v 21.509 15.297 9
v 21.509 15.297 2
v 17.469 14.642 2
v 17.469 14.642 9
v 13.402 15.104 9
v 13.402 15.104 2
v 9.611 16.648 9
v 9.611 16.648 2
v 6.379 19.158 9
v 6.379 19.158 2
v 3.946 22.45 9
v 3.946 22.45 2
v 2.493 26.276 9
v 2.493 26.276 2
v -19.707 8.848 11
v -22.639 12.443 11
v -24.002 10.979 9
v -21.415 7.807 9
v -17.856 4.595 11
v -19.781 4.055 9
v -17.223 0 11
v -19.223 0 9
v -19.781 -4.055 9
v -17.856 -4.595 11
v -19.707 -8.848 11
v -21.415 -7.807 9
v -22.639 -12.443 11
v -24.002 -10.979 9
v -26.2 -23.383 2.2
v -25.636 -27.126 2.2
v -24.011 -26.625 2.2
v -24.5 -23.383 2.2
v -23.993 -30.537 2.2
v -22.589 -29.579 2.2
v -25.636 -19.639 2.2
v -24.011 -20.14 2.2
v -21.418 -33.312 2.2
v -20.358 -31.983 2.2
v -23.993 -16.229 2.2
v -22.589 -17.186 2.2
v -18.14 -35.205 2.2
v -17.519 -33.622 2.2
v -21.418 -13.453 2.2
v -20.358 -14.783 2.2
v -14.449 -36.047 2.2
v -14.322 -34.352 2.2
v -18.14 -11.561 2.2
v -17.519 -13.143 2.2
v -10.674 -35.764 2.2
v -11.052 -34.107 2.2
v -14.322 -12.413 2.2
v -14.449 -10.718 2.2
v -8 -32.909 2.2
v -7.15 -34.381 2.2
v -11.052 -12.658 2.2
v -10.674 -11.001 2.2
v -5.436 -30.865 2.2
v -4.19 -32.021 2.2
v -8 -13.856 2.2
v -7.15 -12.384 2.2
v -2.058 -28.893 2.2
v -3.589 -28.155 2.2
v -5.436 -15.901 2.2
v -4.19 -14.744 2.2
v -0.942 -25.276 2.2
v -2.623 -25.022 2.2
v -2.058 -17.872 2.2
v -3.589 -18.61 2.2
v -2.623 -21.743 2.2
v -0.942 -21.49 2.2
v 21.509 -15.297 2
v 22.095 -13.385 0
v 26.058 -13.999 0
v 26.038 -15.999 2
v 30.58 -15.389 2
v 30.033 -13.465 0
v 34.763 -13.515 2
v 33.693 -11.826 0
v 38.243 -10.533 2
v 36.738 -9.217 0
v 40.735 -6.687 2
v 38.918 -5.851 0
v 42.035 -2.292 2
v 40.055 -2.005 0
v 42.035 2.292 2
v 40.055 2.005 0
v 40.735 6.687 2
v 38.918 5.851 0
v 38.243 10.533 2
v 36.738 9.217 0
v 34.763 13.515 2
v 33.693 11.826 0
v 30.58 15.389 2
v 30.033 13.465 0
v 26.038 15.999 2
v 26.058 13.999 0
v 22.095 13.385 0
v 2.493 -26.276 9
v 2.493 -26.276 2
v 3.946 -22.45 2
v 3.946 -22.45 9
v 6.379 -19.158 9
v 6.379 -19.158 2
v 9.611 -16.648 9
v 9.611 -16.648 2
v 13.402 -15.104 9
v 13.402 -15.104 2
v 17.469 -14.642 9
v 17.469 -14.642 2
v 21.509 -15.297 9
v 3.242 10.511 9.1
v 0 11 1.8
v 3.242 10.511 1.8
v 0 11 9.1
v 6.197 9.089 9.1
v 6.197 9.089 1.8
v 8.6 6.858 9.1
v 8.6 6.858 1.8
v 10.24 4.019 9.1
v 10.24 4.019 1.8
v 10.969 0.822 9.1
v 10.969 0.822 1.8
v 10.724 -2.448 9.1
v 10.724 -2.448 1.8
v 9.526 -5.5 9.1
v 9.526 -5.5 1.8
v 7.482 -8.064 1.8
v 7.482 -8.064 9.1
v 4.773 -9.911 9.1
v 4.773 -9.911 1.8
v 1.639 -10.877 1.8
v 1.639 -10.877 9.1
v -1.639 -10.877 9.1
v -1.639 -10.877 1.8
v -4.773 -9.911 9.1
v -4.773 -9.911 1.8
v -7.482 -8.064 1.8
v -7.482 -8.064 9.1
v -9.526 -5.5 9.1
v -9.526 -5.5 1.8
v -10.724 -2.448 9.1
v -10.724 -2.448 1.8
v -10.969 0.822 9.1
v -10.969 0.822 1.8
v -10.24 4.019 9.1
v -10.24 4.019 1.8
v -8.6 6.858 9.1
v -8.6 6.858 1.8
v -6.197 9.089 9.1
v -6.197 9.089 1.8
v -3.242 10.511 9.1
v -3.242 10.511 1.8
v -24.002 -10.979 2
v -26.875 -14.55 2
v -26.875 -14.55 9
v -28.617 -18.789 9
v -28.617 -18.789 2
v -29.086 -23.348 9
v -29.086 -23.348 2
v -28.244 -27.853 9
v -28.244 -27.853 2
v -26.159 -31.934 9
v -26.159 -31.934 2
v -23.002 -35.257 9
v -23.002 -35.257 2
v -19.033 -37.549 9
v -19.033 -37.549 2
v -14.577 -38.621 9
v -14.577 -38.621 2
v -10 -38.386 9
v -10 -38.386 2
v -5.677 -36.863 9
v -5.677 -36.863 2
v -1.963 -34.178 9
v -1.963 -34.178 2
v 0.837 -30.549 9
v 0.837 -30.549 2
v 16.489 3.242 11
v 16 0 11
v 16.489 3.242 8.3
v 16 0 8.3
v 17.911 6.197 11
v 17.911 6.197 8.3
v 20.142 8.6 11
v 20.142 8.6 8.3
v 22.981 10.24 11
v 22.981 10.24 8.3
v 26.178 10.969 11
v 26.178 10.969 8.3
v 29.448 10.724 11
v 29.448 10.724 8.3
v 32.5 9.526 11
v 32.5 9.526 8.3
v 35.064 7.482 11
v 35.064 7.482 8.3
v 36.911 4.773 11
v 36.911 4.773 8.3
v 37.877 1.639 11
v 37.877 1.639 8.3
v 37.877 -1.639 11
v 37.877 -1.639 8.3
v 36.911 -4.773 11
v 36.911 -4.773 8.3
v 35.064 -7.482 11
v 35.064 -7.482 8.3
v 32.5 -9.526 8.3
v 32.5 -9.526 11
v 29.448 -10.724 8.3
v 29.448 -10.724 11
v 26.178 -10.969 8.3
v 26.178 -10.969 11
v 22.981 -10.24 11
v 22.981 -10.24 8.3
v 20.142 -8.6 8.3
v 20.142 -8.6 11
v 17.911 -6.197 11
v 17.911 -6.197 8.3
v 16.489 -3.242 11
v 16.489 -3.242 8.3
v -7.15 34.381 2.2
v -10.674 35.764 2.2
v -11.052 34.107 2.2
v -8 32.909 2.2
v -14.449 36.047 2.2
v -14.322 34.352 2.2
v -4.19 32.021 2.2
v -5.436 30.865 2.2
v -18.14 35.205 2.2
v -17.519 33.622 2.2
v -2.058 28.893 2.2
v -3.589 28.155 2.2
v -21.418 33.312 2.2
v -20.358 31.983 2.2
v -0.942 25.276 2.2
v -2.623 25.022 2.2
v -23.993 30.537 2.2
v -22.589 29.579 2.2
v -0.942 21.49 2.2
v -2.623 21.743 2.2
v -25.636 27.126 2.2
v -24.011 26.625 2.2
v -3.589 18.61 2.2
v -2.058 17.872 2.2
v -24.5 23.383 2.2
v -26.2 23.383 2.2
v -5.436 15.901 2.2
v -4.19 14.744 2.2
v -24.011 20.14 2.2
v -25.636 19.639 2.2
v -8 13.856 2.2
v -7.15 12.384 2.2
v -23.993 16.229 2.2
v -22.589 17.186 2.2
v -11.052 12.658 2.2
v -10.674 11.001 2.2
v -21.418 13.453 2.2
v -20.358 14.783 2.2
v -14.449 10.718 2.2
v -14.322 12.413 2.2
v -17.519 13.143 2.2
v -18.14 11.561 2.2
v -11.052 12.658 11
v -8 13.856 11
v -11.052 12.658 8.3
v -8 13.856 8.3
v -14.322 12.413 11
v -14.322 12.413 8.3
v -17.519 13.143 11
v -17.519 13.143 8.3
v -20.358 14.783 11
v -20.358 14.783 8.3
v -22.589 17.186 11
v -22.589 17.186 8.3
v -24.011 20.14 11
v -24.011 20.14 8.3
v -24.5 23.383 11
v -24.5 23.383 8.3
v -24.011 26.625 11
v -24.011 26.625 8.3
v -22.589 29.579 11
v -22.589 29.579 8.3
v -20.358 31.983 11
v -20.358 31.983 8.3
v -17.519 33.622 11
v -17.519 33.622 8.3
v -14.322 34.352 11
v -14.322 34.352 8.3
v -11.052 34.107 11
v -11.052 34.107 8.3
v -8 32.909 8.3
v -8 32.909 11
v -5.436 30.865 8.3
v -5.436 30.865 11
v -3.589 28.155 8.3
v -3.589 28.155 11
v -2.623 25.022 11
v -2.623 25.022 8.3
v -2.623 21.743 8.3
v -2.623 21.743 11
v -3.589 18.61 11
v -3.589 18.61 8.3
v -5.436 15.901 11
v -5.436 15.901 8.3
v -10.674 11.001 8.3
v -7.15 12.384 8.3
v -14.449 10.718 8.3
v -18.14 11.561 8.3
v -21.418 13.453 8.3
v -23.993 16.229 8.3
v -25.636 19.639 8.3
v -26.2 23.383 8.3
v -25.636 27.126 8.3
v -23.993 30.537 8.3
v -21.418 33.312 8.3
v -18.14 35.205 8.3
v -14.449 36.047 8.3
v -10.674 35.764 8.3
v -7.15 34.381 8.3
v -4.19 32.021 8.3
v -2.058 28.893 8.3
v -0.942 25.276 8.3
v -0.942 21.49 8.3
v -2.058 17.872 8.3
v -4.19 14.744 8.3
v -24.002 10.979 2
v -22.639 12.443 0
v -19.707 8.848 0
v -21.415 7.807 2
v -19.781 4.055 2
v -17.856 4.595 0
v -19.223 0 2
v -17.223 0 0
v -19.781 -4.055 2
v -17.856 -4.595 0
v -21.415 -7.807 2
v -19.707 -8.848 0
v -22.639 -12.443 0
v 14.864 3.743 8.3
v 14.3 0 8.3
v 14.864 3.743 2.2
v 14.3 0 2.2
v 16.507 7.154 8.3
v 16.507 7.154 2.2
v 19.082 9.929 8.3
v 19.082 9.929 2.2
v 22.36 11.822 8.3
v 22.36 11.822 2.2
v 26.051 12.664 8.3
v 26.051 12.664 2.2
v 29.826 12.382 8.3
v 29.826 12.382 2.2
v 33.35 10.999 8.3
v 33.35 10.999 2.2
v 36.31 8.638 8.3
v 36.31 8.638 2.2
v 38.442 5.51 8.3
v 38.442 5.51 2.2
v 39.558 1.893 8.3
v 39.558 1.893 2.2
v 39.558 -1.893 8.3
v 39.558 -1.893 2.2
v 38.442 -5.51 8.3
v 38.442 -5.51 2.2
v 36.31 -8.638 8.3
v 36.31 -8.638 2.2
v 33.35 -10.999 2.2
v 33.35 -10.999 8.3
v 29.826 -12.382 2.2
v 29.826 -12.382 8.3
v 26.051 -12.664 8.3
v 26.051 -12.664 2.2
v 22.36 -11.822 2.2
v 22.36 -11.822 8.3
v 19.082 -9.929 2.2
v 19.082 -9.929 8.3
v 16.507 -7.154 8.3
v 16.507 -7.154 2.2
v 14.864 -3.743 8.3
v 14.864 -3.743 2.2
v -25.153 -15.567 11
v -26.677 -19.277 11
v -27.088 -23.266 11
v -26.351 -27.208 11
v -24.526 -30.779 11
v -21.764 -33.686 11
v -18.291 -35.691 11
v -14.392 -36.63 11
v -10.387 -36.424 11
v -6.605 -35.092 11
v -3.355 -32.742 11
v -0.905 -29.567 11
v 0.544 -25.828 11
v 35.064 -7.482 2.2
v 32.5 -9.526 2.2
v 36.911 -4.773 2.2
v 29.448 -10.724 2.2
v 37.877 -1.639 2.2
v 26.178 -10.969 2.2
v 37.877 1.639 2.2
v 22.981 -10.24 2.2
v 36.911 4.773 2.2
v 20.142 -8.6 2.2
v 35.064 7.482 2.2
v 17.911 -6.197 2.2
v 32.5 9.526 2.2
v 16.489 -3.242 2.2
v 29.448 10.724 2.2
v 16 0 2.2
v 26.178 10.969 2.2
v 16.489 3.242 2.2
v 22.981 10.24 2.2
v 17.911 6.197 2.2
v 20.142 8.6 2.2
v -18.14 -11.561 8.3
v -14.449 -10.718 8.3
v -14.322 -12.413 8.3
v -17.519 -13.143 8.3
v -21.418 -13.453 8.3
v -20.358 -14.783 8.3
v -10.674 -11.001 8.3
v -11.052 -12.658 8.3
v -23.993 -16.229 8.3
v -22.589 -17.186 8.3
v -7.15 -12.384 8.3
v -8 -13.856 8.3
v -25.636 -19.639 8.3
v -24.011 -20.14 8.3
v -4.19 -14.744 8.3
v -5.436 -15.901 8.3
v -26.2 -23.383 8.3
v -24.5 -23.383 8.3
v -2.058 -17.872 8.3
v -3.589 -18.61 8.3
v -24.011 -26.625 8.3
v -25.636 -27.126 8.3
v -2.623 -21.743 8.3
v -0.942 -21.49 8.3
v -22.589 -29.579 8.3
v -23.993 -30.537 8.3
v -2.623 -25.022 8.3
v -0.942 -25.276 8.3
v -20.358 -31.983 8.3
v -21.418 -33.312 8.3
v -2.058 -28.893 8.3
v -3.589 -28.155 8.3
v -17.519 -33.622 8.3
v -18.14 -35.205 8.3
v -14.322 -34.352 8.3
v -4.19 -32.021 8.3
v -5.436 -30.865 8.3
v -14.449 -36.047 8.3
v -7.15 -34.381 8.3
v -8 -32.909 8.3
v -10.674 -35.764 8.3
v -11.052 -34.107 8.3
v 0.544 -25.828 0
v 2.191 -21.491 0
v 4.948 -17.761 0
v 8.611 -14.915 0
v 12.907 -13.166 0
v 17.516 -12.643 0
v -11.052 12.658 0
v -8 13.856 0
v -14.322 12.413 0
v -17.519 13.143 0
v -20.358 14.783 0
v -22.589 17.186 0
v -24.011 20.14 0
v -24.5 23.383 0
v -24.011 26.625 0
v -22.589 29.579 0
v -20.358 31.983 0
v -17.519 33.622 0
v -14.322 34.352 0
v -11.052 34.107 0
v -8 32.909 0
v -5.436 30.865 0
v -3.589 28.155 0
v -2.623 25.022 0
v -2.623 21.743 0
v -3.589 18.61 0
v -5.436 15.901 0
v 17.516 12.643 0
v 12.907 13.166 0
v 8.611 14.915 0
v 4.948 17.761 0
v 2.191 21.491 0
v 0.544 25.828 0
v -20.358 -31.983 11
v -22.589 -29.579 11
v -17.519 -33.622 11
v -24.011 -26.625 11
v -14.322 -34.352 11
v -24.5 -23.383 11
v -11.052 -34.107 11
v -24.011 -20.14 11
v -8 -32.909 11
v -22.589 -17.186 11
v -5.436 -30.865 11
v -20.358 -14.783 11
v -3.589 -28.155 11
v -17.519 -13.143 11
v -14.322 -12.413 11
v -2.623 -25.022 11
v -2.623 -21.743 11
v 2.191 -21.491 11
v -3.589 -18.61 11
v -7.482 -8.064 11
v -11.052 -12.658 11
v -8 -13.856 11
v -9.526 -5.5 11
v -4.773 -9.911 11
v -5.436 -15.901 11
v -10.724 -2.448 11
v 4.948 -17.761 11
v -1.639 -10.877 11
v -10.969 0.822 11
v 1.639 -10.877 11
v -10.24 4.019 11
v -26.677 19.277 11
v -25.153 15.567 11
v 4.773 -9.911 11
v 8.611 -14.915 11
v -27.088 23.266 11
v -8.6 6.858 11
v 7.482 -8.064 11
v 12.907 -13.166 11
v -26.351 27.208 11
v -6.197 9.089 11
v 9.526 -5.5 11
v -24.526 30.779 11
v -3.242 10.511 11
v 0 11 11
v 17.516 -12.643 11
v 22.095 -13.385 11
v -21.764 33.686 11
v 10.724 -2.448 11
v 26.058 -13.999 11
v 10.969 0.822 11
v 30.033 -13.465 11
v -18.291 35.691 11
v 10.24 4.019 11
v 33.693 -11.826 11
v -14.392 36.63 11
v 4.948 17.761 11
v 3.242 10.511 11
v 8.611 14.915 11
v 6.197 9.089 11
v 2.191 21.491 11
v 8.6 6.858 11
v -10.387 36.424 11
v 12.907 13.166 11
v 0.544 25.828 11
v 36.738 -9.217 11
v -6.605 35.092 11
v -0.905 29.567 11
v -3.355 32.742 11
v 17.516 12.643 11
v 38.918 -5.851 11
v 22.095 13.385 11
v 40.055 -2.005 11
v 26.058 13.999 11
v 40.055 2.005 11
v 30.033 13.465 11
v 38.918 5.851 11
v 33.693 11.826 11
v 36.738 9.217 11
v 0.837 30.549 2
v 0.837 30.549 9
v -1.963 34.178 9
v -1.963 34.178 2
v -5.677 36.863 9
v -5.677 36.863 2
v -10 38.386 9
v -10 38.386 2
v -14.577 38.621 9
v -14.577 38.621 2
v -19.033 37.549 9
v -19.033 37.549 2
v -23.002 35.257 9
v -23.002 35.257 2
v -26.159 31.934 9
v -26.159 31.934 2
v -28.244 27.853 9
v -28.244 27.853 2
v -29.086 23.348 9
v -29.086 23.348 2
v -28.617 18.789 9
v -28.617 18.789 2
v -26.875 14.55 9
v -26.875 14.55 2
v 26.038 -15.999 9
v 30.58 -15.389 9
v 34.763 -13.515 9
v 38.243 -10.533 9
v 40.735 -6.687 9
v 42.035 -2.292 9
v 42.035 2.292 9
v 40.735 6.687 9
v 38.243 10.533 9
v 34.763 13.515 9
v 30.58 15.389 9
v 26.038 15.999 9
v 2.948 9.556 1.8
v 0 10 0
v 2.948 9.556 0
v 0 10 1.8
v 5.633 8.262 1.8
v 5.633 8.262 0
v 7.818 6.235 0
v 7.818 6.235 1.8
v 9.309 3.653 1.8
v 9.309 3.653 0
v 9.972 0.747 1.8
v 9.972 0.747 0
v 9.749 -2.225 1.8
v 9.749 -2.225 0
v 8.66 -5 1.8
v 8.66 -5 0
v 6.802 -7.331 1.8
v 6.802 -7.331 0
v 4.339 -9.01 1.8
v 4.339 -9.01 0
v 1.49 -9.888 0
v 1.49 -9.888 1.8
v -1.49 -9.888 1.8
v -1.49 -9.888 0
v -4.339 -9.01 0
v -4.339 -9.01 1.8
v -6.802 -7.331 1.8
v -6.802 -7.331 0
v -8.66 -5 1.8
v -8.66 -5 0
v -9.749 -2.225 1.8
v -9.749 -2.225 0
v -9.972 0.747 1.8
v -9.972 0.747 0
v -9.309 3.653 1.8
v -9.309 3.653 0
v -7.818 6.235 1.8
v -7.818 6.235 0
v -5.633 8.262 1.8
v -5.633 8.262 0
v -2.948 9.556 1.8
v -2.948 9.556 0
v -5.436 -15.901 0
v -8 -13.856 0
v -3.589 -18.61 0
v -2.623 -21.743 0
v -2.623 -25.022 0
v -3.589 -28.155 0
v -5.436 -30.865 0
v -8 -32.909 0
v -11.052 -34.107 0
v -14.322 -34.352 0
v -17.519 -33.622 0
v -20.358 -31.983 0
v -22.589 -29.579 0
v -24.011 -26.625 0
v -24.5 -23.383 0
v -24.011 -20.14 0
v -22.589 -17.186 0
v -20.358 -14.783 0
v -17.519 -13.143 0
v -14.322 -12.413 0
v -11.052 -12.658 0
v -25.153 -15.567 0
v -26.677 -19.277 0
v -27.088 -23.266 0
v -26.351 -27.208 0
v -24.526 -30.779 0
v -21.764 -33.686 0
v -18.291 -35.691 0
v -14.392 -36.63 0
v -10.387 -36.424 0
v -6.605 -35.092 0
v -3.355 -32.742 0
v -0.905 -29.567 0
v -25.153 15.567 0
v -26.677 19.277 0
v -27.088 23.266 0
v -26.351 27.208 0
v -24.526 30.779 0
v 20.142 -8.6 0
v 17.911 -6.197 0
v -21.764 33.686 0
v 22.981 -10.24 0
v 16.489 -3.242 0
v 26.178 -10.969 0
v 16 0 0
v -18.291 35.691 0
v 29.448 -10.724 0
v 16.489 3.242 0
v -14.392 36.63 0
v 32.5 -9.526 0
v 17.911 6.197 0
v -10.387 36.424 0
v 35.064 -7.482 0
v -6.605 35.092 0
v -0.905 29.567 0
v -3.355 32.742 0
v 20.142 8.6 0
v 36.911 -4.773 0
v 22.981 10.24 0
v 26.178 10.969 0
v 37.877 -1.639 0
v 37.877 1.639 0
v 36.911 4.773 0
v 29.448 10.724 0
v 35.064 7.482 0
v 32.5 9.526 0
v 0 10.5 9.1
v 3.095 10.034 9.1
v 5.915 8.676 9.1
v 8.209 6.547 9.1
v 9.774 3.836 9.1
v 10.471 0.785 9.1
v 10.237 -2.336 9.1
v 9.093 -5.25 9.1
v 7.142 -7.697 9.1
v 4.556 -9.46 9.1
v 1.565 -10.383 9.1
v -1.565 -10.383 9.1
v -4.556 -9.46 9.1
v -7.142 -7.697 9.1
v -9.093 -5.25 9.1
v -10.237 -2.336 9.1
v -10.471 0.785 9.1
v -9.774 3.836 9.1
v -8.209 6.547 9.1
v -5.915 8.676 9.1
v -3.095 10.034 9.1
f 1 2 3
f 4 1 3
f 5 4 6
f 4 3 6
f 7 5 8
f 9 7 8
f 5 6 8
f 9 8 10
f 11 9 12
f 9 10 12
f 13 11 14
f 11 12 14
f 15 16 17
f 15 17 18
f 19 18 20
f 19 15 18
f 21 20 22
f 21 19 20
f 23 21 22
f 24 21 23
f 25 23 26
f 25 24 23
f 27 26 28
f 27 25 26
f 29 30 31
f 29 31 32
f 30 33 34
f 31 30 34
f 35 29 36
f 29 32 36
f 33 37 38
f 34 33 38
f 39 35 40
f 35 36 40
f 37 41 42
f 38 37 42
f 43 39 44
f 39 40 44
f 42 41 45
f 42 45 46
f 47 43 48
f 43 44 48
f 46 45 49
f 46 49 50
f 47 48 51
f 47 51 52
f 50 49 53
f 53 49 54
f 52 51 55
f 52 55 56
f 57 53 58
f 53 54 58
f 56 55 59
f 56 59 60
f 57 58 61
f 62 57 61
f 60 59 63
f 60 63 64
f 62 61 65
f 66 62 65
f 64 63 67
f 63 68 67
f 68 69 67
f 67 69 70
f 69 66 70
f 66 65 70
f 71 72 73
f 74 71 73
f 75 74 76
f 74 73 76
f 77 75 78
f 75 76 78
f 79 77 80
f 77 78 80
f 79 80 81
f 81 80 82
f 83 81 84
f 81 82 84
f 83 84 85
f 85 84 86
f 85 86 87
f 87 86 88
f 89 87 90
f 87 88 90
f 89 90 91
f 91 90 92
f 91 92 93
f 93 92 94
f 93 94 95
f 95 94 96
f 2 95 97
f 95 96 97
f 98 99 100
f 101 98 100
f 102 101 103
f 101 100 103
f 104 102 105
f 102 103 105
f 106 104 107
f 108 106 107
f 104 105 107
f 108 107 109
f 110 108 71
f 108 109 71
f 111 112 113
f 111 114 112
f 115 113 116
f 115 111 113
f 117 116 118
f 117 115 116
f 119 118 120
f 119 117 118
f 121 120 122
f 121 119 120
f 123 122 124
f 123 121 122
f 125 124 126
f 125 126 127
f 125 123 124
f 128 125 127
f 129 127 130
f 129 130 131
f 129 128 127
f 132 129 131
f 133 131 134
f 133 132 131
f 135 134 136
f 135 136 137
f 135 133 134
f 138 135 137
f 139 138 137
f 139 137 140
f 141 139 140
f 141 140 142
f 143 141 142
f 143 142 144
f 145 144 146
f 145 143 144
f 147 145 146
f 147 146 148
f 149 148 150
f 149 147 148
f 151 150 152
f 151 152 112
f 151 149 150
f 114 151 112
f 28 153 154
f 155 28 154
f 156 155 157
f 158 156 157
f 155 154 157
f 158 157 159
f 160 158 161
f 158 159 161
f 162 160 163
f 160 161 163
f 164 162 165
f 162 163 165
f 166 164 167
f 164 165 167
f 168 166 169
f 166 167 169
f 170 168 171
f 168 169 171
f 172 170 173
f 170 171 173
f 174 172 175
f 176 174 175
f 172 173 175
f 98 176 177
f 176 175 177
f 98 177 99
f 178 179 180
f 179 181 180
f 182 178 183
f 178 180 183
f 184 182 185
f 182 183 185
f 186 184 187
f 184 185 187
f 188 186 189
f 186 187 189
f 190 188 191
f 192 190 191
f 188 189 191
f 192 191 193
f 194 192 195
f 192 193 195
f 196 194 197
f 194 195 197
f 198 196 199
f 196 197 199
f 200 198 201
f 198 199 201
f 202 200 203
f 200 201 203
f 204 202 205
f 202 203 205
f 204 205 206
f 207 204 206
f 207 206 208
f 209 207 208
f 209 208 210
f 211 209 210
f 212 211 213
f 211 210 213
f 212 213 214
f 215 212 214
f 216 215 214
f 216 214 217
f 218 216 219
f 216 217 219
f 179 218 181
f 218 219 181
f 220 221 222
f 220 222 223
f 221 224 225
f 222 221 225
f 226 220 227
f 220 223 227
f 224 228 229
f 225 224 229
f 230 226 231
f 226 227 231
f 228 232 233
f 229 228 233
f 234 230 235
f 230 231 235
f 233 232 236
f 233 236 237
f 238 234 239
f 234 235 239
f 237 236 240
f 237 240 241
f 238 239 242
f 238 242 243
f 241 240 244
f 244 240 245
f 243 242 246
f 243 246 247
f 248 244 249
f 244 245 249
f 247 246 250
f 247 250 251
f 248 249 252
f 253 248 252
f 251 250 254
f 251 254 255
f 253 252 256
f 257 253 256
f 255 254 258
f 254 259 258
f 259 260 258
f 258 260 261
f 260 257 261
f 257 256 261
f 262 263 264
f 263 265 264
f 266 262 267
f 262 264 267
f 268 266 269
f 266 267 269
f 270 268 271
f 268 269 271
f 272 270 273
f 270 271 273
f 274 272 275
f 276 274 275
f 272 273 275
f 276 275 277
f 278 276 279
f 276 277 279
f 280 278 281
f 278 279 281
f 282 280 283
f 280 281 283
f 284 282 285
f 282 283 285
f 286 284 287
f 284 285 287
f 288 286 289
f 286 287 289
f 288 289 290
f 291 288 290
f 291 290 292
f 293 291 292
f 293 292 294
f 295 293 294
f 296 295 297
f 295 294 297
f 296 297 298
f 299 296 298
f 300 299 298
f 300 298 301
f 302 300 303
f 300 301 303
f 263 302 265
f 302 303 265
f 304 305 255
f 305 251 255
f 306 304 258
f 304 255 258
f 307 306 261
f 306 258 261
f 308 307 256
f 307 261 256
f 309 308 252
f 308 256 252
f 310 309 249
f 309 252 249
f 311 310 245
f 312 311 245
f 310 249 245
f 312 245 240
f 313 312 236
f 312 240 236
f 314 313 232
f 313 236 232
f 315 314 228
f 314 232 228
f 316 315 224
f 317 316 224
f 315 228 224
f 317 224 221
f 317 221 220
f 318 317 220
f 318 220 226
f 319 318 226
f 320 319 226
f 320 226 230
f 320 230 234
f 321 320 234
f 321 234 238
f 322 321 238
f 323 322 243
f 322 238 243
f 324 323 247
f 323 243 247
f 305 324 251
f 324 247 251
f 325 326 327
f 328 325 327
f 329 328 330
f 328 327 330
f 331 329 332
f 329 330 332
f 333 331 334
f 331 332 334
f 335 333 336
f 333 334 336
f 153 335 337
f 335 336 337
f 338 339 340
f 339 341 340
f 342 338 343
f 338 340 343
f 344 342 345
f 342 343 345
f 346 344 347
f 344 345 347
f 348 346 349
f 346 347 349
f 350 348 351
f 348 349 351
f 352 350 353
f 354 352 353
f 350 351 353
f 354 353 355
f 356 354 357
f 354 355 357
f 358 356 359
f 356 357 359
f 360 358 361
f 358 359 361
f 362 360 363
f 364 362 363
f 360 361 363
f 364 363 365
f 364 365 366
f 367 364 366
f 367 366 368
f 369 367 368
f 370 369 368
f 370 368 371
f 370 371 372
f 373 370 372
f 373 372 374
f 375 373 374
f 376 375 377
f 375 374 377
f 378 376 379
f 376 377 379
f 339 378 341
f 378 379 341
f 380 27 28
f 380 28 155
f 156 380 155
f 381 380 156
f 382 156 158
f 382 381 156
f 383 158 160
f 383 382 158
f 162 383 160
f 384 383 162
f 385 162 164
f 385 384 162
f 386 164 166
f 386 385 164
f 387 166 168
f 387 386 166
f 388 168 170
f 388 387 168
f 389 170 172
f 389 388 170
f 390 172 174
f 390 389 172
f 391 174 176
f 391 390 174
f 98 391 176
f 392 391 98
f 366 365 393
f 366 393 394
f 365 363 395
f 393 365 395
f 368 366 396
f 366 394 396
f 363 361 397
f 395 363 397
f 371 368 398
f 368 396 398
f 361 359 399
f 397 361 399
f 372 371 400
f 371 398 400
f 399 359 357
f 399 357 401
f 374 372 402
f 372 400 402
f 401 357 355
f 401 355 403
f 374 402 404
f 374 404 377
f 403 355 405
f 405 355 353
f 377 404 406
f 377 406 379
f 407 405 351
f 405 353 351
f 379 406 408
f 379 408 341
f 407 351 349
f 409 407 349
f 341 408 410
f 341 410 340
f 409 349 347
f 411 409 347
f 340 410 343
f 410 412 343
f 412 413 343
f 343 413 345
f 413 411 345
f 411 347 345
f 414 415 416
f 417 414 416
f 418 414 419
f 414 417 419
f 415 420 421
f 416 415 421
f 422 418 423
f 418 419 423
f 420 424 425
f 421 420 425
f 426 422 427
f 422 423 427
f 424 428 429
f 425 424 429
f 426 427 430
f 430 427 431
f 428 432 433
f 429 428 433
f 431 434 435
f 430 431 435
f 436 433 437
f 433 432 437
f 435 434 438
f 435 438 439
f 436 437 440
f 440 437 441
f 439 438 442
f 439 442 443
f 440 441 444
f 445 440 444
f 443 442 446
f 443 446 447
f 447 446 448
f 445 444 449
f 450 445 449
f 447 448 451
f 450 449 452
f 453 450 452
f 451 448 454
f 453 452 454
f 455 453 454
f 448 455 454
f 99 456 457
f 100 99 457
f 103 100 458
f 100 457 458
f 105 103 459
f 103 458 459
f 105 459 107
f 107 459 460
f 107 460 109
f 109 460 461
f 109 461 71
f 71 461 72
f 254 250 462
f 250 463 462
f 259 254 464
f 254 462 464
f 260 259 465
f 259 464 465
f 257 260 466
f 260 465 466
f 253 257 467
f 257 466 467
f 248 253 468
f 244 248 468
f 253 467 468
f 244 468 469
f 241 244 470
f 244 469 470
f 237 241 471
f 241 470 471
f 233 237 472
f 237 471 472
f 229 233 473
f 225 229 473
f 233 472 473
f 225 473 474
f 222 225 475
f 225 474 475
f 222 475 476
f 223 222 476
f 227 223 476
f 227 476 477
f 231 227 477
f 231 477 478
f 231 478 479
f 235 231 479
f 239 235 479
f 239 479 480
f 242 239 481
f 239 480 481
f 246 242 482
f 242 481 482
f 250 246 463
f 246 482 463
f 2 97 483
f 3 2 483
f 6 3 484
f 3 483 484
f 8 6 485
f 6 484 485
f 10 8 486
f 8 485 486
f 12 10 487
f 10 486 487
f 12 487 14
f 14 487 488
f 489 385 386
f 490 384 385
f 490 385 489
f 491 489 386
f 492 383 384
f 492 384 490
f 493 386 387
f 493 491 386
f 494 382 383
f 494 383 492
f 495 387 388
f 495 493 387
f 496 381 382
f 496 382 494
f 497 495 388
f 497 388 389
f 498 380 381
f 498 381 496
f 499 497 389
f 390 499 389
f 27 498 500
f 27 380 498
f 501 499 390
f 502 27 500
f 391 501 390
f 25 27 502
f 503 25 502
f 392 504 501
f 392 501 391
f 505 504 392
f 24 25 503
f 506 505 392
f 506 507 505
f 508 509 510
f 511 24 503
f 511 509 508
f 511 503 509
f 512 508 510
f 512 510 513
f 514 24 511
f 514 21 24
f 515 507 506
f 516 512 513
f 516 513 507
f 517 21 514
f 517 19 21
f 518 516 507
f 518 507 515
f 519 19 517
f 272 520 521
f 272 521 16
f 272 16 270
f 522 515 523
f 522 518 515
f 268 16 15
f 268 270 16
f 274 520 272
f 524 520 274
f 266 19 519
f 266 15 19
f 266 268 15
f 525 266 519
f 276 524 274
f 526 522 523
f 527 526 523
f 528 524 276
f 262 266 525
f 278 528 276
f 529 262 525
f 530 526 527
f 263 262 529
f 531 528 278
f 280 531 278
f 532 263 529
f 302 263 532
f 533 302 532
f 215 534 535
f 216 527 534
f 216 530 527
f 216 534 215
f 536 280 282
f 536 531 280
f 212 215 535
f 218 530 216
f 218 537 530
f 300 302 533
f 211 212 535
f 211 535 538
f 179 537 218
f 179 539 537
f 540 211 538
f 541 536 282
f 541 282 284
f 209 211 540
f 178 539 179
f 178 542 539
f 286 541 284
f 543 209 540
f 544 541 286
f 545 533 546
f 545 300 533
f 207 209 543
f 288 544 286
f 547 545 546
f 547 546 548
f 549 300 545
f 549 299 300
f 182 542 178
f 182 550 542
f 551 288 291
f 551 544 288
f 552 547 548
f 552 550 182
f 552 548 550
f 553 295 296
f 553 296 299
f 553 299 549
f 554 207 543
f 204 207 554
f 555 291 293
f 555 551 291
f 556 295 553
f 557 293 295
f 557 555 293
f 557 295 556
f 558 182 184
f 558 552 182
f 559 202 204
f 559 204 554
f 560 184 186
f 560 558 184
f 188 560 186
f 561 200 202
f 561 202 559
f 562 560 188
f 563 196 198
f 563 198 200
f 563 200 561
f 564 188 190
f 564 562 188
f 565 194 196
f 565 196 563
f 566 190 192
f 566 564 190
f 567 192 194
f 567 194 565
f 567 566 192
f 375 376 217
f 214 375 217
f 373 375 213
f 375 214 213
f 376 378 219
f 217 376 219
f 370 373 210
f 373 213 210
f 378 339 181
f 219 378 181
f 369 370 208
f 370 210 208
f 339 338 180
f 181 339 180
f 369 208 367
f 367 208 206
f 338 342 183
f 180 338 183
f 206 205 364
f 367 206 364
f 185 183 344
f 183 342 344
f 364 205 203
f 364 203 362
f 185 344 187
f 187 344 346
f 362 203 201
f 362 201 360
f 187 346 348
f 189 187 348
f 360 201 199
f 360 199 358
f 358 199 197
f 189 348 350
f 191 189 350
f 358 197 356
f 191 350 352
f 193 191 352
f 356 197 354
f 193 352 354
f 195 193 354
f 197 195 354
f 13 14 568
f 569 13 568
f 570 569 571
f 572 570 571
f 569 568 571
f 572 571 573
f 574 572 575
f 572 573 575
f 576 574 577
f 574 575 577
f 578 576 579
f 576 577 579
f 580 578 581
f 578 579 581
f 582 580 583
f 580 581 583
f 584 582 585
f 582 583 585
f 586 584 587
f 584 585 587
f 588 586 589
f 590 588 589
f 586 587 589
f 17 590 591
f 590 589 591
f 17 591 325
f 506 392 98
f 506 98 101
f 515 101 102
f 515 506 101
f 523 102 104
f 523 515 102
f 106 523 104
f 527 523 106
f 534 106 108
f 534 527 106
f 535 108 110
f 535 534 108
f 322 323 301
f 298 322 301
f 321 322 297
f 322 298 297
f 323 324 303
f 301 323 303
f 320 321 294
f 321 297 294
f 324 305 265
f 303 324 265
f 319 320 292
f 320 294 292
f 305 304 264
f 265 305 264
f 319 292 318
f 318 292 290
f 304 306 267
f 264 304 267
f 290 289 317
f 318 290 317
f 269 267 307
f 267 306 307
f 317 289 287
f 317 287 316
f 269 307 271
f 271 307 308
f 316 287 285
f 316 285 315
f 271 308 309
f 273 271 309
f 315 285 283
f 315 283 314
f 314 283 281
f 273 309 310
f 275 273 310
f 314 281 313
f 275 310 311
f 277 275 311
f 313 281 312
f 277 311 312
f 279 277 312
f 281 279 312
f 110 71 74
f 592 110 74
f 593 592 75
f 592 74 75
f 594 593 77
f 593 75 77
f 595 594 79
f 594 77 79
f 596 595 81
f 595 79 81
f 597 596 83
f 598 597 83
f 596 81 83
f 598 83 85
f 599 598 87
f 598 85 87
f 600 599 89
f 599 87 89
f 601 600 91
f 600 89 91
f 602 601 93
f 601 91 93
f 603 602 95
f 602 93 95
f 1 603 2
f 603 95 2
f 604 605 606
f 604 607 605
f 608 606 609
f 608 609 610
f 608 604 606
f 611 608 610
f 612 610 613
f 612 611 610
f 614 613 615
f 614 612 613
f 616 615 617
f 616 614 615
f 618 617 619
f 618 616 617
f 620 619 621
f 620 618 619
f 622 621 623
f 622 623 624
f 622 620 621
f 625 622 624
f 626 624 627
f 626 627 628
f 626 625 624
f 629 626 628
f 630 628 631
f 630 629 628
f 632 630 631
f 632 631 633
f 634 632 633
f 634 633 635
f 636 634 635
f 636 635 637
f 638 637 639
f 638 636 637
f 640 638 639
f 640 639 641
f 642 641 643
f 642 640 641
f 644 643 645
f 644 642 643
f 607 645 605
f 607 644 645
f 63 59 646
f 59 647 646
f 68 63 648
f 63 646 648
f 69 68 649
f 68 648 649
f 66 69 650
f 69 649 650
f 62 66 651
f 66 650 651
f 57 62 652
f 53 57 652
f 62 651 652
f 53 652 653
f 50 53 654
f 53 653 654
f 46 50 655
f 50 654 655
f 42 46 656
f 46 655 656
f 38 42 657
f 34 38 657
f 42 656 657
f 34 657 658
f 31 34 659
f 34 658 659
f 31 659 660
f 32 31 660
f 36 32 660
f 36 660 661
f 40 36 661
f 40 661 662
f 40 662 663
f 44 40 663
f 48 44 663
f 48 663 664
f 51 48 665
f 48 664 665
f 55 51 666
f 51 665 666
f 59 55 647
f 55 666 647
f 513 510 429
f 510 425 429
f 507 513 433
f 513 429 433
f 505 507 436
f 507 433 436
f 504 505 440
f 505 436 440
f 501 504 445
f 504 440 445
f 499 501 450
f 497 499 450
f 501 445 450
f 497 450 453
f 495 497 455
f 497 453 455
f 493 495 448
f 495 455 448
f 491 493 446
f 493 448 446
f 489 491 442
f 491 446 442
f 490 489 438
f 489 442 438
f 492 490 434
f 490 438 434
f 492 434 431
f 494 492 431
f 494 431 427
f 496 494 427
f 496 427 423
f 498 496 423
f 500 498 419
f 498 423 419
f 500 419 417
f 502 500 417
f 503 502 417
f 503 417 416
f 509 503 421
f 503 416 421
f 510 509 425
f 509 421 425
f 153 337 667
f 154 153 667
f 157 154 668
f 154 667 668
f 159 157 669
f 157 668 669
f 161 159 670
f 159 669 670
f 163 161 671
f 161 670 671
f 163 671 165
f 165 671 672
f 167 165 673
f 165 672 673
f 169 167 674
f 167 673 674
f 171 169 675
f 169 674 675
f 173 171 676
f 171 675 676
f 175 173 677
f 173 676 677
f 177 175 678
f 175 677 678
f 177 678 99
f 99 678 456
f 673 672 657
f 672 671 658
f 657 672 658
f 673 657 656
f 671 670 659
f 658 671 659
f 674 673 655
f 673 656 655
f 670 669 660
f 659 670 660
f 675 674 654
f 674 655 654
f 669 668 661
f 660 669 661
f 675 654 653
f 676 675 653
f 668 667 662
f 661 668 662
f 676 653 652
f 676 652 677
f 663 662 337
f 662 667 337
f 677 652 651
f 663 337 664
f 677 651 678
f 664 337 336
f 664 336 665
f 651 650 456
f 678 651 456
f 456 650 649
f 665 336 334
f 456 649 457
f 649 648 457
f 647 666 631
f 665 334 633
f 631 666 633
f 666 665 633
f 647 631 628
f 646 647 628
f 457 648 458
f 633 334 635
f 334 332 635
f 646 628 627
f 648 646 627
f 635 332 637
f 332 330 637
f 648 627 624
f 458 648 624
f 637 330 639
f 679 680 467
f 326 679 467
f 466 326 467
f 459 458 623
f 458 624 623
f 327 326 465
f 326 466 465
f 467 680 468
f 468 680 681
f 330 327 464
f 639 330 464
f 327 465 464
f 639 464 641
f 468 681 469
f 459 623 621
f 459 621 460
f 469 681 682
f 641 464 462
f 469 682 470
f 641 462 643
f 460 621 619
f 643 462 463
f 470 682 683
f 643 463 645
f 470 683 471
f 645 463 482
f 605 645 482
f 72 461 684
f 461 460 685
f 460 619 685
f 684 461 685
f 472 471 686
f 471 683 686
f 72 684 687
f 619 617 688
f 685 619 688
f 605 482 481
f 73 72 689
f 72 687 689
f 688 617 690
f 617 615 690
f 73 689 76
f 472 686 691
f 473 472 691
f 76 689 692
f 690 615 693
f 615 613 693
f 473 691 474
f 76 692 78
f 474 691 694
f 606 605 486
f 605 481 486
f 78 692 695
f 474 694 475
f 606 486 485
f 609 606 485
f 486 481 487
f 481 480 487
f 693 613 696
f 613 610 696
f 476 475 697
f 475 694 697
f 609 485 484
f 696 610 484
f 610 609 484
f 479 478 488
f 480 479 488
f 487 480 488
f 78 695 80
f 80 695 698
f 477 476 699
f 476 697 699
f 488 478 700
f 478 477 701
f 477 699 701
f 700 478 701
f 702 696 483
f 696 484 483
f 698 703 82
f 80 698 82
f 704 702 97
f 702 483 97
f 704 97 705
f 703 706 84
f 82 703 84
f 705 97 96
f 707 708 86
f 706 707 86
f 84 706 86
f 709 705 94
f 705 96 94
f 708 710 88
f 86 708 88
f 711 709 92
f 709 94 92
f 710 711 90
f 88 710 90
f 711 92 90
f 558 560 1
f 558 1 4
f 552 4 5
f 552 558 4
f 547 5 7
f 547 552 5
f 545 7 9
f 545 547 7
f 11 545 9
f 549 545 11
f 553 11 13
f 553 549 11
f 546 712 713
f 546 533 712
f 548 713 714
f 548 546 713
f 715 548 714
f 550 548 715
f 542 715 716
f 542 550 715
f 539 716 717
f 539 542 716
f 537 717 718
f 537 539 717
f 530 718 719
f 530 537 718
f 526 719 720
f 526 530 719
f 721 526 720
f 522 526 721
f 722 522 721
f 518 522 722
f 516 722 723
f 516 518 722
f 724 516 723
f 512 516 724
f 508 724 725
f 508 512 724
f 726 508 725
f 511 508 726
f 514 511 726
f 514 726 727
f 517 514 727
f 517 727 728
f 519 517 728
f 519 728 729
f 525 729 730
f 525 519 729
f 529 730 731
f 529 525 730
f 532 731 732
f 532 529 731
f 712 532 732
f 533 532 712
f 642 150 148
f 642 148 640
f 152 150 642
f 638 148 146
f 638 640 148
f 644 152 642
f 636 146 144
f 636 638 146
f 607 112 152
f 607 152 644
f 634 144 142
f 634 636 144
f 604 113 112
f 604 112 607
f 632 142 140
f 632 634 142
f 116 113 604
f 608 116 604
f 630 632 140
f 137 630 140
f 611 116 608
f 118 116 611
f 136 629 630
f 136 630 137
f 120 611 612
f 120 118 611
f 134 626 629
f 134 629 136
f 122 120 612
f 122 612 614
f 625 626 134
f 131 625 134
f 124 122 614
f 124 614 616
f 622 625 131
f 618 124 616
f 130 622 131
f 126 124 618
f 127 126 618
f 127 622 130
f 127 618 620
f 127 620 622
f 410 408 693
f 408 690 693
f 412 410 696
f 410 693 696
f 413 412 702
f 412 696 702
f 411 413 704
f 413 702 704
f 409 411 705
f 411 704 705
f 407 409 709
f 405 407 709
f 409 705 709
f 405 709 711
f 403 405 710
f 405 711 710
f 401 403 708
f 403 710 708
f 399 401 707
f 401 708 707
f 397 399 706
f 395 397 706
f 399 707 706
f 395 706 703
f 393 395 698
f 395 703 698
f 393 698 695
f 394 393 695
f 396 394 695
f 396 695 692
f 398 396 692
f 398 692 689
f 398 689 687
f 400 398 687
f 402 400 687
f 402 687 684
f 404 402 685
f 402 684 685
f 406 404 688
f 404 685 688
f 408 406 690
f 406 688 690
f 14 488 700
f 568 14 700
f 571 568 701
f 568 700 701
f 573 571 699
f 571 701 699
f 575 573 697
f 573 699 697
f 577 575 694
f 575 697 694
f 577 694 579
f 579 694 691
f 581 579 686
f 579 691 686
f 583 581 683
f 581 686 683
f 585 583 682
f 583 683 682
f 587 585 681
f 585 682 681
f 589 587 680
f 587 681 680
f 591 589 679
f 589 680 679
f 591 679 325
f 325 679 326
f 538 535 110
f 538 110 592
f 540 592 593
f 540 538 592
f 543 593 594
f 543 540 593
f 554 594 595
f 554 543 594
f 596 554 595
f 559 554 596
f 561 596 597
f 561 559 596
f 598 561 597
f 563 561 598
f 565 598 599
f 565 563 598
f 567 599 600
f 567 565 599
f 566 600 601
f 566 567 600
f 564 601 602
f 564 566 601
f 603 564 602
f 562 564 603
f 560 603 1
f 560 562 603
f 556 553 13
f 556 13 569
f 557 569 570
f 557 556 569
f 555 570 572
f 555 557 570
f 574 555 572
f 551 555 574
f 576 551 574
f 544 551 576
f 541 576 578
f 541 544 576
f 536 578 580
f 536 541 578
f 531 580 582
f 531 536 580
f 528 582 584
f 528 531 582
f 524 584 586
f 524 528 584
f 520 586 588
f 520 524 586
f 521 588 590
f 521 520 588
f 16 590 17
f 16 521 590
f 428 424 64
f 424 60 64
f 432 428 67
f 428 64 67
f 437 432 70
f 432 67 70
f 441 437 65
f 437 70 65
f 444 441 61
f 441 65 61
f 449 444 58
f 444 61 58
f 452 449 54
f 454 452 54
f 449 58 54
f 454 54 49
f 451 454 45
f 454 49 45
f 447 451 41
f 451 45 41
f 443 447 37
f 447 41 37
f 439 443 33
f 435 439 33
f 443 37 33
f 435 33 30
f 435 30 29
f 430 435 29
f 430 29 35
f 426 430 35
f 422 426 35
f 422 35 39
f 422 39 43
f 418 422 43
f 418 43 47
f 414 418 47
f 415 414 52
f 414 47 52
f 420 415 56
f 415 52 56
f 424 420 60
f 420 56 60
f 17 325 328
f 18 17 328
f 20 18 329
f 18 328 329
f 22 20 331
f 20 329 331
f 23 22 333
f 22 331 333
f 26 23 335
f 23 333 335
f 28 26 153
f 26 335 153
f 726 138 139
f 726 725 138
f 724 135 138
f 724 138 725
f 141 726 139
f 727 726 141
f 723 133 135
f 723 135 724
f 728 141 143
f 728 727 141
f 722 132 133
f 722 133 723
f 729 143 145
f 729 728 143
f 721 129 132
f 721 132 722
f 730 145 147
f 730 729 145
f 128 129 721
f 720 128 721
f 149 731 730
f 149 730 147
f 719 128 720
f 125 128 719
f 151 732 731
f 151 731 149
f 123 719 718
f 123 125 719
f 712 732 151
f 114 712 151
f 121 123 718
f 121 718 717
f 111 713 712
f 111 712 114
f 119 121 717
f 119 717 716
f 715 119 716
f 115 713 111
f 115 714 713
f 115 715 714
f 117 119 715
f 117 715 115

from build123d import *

# Parameters (mm, degrees)
F1_DEPTH        = 11
F5_COPIES_COUNT = 3
F6_SIZE         = 2
F7_SIZE         = 2


# Not quite as in the source:
# - a pattern or mirror of a feature is missing from the dataset's text; its kind, count and spacing are read off the source's solid


with BuildPart() as f1:
    # F0 (on Top) → F1 (new body)
    with BuildSketch(Plane.XY):
        with BuildLine():
            ThreePointArc((2.4931063701, -26.2757839441), (9.6114548877, -16.6475282001), (21.5089432149, -15.2969854229))
            ThreePointArc((21.5089432149, -15.2969854229), (42.1995974306, 0), (21.5089432149, 15.2969854229))
            ThreePointArc((21.5089432149, 15.2969854229), (9.6114548877, 16.6475282001), (2.4931063701, 26.2757839441))
            ThreePointArc((2.4931063701, 26.2757839441), (-21.0997987153, 36.5459234044), (-24.002049585, 10.9787985212))
            ThreePointArc((-24.002049585, 10.9787985212), (-19.2229097754, 0), (-24.002049585, -10.9787985212))
            ThreePointArc((-24.002049585, -10.9787985212), (-21.0997987153, -36.5459234044), (2.4931063701, -26.2757839441))
        make_face()
    extrude(amount=F1_DEPTH)

    # F2 (on Right) → F3 (revolve, cut)
    with BuildSketch(Plane.YZ):
        Polygon((0, 11), (0, 0), (10, 0), (10, 1.8), (11, 1.8), (11, 9.1), (10.5, 9.1), (11, 11), align=None)
    revolve(axis=Axis((0, 0, 3.7751235068), (0, 0, -1)), mode=Mode.SUBTRACT)

    # F4 (on Front) → F5 (revolve, cut)
    with BuildSketch(Plane.XZ):
        Polygon((16, 0), (27, 0), (27, 11), (16, 11), (16, 8.3), (14.3, 8.3), (14.3, 2.2), (16, 2.2), align=None)
    f5 = revolve(axis=Axis((27, 0, 6.29213918), (0, 0, -1)), mode=Mode.SUBTRACT)

    # F5_copies: F5 ×3 about axis
    f5_copies_axis = Axis((0, 0, 0), (0, 0, 1))
    for i in range(1, F5_COPIES_COUNT):
        add(f5.rotate(f5_copies_axis, i * 360 / F5_COPIES_COUNT), mode=Mode.SUBTRACT)

    # F6
    f6_edges = [f1.edges().sort_by_distance(p)[0] for p in [
        (9.611455, -16.647528, 11),
    ]]
    chamfer(f6_edges, length=F6_SIZE)

    # F7
    f7_edges = [f1.edges().sort_by_distance(p)[0] for p in [
        (9.611455, -16.647528, 0),
        (-21.099799, -36.545923, 0),
        (-19.22291, 0, 0),
        (-21.099799, 36.545923, 0),
        (42.199597, 0, 0),
        (9.611455, 16.647528, 0),
    ]]
    chamfer(f7_edges, length=F7_SIZE)


solid = f1.part
